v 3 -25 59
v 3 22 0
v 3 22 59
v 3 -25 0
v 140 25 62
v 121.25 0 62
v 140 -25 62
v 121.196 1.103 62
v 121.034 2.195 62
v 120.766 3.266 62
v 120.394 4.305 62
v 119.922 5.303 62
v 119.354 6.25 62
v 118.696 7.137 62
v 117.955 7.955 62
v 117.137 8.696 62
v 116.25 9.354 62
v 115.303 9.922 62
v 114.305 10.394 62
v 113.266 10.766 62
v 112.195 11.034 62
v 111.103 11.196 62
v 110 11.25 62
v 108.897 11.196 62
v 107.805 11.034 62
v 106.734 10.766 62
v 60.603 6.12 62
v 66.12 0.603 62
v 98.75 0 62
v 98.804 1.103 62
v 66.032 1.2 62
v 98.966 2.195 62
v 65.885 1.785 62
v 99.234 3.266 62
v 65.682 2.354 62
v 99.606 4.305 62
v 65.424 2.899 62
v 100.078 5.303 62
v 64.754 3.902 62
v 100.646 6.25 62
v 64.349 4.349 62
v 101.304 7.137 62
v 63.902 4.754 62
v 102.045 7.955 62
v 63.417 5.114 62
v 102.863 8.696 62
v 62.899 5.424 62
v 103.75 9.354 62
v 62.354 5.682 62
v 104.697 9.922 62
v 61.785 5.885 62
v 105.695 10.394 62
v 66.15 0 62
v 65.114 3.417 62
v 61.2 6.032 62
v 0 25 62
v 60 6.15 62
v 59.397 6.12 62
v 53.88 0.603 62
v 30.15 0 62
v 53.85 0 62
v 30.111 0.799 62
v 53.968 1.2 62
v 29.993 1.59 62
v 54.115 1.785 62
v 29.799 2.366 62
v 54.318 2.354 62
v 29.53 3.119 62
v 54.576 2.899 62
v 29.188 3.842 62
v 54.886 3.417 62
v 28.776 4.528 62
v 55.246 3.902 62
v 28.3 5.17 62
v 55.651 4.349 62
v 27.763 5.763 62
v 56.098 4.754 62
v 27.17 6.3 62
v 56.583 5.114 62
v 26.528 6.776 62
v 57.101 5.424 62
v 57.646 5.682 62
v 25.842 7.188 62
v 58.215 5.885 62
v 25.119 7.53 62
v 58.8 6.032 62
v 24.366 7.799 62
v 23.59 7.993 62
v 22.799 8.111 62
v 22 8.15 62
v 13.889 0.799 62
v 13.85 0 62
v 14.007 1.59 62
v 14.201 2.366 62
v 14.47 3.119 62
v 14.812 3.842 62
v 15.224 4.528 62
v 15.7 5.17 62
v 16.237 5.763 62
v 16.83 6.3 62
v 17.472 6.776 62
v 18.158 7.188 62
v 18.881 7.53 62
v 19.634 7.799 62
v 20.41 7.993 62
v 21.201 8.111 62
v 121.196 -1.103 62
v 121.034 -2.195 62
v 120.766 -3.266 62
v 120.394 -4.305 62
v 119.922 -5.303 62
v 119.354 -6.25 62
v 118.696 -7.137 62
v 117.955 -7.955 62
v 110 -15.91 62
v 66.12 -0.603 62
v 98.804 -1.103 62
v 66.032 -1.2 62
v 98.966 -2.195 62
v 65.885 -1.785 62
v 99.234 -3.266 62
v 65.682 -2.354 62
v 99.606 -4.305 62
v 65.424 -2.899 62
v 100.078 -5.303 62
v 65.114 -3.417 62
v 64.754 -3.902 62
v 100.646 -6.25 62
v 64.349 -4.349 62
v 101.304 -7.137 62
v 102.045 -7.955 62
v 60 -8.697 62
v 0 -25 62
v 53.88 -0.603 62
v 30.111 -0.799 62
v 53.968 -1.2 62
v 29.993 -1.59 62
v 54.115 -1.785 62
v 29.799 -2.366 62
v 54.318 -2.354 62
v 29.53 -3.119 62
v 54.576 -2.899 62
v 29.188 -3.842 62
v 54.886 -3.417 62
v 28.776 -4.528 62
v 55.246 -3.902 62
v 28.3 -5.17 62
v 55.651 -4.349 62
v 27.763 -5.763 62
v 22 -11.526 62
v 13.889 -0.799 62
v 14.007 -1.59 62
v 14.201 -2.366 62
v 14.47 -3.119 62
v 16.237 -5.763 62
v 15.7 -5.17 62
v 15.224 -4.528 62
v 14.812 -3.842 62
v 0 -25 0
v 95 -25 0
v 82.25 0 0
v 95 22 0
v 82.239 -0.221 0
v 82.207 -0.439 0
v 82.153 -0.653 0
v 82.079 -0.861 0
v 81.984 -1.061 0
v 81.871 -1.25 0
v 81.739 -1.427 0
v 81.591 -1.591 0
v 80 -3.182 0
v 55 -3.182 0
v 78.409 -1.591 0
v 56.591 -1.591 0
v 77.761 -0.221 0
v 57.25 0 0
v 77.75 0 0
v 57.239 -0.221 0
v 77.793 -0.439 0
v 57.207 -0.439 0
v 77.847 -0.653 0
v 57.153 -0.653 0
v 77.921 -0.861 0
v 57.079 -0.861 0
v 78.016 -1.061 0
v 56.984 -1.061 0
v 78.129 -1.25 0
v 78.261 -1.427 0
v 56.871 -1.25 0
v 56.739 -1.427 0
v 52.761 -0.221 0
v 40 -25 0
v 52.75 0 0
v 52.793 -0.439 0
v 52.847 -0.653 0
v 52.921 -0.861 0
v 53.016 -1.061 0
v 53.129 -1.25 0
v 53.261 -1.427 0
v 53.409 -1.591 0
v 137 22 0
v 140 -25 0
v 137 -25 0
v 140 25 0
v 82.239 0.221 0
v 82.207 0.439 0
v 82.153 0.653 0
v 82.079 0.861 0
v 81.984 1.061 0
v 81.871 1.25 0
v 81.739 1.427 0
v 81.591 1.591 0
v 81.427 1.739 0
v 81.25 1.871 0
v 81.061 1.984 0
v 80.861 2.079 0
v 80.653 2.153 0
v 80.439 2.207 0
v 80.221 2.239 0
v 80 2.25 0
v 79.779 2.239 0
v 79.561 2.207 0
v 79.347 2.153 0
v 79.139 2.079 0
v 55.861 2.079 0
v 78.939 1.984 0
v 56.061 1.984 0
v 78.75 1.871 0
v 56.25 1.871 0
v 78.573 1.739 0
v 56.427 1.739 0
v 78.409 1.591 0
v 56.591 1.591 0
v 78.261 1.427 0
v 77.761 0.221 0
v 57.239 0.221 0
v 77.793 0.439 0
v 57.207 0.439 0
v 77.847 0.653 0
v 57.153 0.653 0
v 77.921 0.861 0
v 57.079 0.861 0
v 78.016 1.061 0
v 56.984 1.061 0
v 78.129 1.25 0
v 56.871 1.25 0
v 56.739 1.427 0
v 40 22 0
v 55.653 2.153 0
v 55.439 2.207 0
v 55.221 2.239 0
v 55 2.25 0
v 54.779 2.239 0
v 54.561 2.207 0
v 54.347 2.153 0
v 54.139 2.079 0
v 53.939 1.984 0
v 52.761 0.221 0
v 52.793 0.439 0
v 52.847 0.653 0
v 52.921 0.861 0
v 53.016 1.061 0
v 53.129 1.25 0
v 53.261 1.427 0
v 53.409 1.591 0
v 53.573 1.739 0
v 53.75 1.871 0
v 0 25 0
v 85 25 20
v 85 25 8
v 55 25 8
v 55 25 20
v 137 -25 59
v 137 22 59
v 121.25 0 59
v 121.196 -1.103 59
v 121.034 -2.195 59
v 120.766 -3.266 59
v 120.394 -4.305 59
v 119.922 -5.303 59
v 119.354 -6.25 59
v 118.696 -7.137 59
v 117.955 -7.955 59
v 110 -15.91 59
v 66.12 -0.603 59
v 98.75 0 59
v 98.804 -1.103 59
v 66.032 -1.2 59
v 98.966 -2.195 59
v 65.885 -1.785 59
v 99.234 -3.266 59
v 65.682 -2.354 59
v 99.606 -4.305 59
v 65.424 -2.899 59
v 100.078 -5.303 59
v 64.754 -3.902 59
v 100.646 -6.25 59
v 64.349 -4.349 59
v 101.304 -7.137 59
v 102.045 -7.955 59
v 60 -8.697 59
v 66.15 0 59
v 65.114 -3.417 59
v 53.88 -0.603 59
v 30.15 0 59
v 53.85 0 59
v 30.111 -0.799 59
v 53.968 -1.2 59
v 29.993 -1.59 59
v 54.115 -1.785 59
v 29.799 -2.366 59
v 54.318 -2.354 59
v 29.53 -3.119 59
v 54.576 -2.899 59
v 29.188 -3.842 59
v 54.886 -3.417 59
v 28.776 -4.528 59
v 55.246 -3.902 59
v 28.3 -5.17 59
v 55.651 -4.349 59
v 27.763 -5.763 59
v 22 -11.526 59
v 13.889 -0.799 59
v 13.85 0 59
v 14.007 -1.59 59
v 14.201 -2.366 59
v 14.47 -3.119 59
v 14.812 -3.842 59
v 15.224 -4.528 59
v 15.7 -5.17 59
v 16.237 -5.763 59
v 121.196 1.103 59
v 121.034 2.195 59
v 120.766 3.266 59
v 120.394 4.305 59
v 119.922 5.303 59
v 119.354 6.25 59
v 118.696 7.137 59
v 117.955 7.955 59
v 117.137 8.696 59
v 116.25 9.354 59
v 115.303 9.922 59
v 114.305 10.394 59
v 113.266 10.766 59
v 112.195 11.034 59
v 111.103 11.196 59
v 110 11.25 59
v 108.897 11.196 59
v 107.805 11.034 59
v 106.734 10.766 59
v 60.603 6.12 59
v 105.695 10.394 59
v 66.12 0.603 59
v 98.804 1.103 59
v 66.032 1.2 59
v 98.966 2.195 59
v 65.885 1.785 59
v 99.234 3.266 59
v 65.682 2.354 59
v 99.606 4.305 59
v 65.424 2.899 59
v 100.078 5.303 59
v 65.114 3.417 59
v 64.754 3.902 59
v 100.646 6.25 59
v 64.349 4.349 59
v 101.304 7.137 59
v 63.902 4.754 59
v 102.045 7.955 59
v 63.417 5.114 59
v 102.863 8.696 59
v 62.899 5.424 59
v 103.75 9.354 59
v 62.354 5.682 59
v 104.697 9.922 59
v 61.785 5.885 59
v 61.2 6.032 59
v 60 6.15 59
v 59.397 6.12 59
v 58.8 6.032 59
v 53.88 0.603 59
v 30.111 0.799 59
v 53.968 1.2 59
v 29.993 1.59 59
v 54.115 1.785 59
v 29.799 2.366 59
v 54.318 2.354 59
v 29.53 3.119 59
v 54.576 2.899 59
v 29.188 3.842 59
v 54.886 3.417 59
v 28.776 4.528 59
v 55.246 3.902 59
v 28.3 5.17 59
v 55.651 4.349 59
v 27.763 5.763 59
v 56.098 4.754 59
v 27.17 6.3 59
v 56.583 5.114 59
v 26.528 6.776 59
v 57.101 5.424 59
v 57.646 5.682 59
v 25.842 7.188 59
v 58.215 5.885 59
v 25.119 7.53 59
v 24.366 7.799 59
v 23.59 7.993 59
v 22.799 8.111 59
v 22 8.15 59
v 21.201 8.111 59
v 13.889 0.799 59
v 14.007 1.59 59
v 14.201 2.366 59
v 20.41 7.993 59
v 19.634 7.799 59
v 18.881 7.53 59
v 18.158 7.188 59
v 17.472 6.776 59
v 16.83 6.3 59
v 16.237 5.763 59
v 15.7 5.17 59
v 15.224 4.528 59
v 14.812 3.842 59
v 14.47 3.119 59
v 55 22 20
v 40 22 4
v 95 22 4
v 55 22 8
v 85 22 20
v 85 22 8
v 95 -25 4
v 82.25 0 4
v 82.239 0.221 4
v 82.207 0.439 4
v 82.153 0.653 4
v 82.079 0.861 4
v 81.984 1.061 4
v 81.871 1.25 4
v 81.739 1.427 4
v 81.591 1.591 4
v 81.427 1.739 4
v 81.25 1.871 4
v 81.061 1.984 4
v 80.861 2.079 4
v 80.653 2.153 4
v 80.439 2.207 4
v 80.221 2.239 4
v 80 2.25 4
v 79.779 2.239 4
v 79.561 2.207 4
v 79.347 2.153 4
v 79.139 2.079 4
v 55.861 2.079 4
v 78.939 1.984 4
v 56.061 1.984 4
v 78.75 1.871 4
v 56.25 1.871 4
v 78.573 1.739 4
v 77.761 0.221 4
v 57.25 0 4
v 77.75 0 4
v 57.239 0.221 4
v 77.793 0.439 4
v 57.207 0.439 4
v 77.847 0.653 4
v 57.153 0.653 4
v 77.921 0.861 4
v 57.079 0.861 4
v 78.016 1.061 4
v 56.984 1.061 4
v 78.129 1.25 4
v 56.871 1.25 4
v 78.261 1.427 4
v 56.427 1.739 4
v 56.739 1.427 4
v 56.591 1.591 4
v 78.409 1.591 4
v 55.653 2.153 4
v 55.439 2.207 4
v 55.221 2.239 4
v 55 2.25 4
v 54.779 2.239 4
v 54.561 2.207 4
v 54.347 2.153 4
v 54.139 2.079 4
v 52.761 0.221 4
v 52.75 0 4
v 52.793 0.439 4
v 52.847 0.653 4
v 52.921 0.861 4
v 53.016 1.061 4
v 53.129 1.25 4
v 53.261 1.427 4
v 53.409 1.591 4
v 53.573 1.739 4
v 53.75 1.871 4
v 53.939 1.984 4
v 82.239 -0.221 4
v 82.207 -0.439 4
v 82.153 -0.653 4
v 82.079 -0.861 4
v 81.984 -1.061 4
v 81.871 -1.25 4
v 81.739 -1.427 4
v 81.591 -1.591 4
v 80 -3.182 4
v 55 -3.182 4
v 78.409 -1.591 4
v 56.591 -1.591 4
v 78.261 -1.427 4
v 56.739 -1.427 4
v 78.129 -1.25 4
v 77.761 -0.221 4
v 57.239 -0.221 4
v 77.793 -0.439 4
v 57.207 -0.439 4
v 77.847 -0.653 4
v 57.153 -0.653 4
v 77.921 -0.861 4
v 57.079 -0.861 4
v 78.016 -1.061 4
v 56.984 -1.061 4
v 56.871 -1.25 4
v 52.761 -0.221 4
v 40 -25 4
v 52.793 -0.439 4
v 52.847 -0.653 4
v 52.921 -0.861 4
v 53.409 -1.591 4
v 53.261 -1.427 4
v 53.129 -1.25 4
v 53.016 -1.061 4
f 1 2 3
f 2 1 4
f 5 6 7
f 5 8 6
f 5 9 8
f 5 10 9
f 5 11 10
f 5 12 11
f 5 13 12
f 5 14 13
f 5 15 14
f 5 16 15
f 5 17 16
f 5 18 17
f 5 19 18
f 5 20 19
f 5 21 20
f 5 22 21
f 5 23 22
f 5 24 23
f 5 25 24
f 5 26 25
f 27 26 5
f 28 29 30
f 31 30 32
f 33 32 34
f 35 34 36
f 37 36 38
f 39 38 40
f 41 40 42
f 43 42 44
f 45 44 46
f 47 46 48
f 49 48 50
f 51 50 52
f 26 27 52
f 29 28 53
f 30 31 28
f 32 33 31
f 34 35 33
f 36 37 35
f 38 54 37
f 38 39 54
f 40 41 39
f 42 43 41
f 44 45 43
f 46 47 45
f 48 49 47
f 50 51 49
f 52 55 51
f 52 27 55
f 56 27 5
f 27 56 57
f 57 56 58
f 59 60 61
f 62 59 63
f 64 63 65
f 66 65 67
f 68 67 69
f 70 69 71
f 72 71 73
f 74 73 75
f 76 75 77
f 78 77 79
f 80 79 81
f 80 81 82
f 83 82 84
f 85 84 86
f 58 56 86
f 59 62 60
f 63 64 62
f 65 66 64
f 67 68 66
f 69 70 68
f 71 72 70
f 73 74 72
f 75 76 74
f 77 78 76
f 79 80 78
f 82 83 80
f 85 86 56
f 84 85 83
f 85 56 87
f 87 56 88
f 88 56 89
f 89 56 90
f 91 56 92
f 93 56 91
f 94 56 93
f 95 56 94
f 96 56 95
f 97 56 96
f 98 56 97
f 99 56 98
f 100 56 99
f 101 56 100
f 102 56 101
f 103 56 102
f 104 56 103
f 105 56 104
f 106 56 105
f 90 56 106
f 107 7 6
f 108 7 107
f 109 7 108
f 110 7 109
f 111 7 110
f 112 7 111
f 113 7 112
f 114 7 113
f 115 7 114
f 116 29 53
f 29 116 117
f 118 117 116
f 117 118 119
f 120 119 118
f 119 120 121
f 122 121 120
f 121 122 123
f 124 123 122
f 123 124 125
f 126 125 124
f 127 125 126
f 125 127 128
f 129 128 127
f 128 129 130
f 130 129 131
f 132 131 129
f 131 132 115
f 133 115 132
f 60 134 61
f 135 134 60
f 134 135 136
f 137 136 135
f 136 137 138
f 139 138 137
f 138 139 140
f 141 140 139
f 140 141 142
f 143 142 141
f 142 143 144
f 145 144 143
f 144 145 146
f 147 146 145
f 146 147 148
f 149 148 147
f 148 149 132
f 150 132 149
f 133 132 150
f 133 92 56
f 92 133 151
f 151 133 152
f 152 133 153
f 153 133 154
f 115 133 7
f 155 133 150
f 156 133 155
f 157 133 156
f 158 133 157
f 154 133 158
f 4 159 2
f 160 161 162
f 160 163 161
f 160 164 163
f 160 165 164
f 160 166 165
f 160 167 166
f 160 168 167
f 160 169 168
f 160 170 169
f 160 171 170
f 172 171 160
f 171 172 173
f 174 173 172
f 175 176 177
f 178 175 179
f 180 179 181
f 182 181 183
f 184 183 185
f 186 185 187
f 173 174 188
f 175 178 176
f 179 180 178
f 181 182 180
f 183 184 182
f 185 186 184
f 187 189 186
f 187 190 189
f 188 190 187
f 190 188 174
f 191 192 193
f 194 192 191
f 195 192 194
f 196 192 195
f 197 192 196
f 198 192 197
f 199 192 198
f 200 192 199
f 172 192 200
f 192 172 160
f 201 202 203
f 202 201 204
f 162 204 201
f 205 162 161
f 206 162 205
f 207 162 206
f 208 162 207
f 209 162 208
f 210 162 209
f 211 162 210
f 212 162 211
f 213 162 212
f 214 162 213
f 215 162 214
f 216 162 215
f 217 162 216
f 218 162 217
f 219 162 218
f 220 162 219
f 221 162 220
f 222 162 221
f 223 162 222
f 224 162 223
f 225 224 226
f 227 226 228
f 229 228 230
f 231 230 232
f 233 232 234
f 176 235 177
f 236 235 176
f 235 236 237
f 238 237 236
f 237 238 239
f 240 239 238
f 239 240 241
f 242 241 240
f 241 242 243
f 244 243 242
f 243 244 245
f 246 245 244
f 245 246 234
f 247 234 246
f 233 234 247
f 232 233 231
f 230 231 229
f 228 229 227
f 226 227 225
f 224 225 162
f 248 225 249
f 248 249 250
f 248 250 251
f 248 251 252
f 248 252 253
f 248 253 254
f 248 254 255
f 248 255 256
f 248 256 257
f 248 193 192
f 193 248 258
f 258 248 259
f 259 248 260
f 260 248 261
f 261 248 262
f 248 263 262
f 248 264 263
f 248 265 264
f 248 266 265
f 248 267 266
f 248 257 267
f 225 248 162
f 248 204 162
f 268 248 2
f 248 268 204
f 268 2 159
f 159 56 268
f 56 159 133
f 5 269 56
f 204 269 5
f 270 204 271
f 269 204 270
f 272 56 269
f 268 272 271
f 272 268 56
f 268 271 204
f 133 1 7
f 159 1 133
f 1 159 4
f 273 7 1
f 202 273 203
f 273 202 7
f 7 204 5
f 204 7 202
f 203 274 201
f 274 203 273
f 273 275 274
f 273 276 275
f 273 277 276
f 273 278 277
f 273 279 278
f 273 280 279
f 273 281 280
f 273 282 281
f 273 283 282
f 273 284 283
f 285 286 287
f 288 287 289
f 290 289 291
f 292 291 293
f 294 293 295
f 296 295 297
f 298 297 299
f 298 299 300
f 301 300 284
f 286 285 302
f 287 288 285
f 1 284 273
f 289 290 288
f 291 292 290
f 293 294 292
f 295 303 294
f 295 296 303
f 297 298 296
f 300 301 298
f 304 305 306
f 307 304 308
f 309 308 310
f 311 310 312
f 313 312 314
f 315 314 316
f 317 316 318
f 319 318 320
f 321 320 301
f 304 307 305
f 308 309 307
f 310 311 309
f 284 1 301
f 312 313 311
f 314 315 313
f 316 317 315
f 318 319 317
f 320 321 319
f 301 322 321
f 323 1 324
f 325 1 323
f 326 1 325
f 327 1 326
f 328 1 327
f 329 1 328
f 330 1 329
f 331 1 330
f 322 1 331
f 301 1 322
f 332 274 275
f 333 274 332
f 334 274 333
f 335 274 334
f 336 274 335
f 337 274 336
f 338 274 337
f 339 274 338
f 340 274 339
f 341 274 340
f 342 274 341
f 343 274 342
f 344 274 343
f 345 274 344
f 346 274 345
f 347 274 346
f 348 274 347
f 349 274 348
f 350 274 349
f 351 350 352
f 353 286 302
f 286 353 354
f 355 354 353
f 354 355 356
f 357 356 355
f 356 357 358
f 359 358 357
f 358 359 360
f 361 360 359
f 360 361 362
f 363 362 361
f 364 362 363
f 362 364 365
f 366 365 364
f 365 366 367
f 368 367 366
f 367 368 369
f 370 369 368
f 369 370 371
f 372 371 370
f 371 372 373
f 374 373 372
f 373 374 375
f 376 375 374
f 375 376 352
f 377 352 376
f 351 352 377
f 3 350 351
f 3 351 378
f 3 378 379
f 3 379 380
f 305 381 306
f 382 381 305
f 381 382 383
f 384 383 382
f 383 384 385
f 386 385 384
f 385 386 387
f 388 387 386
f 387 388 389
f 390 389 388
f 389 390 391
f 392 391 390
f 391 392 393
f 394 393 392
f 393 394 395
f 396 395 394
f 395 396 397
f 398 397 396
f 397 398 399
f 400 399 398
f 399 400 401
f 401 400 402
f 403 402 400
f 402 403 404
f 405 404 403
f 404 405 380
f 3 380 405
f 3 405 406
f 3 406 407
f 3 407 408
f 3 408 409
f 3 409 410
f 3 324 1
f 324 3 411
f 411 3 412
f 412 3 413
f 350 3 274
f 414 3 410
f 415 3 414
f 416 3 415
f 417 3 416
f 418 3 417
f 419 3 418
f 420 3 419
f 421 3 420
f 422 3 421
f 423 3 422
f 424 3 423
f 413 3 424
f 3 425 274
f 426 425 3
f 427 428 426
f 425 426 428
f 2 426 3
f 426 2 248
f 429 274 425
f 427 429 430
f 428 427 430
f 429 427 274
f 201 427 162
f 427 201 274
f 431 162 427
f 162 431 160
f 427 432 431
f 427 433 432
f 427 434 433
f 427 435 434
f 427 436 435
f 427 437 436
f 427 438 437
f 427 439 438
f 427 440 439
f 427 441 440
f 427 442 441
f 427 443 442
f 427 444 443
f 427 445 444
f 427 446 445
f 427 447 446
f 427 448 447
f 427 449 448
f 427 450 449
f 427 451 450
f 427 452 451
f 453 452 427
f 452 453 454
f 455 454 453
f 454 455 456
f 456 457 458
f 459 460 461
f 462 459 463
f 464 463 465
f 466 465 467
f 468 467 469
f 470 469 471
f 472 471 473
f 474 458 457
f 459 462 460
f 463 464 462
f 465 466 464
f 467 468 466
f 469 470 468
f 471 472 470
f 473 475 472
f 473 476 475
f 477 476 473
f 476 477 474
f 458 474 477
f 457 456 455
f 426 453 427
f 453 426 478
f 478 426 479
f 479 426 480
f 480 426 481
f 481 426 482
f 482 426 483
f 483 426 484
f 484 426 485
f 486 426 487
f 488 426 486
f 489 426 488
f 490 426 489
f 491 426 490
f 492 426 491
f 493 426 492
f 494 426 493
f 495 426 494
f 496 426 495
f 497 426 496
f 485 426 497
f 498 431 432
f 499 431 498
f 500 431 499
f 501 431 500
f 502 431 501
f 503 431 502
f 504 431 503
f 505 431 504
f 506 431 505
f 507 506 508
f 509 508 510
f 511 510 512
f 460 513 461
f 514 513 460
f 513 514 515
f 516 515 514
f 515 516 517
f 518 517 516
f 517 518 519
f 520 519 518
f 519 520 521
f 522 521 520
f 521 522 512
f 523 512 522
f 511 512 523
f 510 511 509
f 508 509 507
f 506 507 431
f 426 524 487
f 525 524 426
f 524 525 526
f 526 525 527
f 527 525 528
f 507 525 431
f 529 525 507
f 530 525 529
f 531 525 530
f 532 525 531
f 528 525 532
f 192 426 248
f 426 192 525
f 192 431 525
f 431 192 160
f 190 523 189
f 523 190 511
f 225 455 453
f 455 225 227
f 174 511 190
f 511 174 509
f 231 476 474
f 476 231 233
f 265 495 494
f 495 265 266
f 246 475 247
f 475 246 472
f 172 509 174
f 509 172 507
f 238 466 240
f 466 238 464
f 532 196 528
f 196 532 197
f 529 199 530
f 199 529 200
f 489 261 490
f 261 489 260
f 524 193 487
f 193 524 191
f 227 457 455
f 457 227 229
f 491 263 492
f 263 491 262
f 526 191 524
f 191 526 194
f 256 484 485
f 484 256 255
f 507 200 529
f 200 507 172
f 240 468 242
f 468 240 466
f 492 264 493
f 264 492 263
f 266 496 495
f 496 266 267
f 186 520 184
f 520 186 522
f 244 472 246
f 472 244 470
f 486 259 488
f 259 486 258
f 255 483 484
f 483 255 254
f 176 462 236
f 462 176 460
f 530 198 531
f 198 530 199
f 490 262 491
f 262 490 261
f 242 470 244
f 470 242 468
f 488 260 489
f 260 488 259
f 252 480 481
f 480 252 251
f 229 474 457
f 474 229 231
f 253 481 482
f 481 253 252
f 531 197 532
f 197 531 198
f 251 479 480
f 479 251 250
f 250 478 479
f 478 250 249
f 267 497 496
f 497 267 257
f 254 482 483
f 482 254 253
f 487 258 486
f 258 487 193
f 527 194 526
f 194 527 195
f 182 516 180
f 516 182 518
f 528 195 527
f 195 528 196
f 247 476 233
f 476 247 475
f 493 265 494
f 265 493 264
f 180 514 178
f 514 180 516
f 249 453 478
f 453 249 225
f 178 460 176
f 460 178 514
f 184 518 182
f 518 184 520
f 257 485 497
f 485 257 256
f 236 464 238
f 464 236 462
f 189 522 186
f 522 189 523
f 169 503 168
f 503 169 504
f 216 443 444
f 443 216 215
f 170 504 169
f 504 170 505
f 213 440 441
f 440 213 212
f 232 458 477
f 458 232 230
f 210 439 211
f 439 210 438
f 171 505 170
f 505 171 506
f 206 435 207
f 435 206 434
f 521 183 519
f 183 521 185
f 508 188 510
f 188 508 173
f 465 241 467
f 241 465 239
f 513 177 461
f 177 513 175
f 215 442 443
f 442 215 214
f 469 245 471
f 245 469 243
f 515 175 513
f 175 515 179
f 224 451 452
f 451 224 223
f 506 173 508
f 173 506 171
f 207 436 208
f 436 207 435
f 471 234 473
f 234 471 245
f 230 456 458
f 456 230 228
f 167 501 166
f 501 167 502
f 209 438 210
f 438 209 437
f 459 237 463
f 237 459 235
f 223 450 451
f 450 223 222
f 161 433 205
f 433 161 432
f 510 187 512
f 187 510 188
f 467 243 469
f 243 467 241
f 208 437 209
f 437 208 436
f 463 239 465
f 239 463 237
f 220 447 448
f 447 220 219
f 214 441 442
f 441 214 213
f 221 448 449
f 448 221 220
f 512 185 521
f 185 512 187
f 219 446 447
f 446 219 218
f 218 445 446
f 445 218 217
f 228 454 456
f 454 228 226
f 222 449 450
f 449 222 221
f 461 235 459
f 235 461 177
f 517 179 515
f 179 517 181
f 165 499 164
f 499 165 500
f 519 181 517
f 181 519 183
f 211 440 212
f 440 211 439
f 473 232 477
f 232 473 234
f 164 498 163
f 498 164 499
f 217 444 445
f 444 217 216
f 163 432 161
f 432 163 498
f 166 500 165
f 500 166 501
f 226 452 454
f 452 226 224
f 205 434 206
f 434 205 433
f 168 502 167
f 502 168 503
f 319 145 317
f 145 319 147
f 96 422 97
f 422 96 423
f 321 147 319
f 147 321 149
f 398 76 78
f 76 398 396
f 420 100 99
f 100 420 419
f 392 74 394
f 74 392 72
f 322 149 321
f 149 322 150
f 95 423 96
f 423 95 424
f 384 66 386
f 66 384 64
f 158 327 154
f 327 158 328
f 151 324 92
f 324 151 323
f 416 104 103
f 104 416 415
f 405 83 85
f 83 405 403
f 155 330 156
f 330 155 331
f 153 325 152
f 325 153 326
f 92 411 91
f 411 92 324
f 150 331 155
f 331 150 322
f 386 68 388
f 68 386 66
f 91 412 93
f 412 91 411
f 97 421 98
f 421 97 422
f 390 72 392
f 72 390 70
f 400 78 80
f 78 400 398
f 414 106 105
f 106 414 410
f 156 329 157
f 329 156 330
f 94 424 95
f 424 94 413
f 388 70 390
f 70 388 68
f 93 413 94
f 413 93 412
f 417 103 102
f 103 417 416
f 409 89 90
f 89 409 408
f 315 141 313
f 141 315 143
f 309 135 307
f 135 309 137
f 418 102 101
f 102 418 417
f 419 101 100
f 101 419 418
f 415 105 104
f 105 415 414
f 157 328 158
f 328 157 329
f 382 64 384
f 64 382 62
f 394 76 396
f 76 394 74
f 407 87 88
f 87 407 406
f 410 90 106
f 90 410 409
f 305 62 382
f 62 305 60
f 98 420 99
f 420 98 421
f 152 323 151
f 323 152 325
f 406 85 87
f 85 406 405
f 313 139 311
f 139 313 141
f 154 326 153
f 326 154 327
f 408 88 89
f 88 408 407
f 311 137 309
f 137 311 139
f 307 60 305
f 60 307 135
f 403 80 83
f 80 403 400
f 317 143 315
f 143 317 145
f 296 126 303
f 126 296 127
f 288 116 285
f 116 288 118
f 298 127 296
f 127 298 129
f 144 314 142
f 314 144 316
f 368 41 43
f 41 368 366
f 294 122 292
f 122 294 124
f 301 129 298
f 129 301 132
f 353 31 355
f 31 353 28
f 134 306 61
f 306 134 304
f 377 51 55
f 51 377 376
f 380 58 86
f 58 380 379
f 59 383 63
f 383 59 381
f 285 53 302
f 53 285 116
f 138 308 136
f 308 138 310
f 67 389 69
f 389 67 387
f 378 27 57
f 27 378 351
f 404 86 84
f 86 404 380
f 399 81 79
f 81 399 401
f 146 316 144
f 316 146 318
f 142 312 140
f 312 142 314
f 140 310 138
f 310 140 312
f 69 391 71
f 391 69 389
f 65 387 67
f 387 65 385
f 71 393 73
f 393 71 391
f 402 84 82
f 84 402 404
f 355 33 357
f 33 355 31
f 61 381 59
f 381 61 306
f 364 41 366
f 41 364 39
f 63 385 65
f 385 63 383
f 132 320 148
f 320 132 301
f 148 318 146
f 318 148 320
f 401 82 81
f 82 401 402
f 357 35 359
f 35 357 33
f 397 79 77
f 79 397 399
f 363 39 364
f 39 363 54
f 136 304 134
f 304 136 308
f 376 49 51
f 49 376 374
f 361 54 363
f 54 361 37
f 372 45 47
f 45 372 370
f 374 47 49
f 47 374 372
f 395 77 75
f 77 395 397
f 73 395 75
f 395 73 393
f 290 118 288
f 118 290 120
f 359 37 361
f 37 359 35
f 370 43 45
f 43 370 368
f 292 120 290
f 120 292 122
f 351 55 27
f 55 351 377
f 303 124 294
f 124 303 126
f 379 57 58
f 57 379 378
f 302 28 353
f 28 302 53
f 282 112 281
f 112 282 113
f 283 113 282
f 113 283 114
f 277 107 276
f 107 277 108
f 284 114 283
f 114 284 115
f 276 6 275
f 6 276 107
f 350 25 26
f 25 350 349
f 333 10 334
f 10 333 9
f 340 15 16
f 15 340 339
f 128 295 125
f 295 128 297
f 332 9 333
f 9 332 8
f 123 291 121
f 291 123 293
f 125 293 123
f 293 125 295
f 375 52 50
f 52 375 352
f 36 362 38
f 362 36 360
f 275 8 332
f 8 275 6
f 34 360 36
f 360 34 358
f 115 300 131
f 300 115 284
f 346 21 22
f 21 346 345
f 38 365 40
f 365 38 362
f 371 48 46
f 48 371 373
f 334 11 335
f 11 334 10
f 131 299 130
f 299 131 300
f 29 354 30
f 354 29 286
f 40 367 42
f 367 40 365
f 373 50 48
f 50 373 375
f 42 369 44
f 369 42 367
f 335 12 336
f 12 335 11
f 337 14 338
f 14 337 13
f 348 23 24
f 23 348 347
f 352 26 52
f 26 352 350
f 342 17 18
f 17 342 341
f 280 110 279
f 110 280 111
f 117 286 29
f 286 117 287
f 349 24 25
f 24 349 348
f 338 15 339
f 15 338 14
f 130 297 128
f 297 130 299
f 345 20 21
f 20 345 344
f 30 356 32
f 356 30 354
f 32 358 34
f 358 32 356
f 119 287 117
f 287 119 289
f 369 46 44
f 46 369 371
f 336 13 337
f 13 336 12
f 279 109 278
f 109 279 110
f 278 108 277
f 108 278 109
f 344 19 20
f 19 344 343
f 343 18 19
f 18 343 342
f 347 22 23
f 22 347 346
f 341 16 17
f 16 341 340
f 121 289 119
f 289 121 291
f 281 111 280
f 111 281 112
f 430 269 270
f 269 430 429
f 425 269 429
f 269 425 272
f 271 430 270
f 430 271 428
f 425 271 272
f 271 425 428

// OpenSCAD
// Temporary control console for the physical drive test (v3 chassis).
// Holds the 22 mm E-stop (NC -> D33), the covered toggle switch and the
// START/ARM push button (D32). Bolts to the top M4 grid of
// rail_extension_left at global X100/X125 (25 mm pitch, rail centreline).
// Not the final location: the body-panel concept puts these in a rear console.
//
// Local frame: X along the rail (global X = x + 45), Y across the rail
// (+Y outboard), Z up from the rail top. Units mm.
//
// Print: lying on the outer wall (part="print"), inner side up. All walls are
// then vertical, the holes are horizontal teardrops and nothing needs support.
// Bolting: M4x40 up from under the rail, washer + nut on the foot inside the
// console (reach through the open inner side).

part = "assembly"; // [assembly, print, fit_coupon]
$fn = 64;

// Measured by the user 2026-10-16 (body below the panel):
estop_body   = [35, 30];   // contact-block footprint
toggle_body  = [27, 15];
button_body_d = 15;

// Panel holes. Defaults are the usual sizes for these parts; print
// part="fit_coupon" first and adjust here if a part is loose or tight.
estop_hole  = 22.5;
toggle_hole = 12.3;
button_hole = 16.3; // R16-504BD, ordered-parts G7

L = 140; W = 50; H = 62;        // console envelope, H = rail top to panel top
wall = 3; panel_t = 3; foot_t = 4;
foot_x0 = 40; foot_x1 = 95;
grid_x = [55, 80];              // global X100 / X125
m4_clear = 4.5;

// Component centres along X on the panel.
button_x = 22; toggle_x = 60; estop_x = 110;

// Teardrop hole along Z whose point faces -Y (print "up" in part="print").
module teardrop_z(d, h) {
    linear_extrude(height = h, center = true)
        union() {
            circle(d = d);
            rotate(45 + 180) square(d / 2);   // 45 deg roof toward -Y
        }
}

module console() {
    difference() {
        union() {
            translate([0, -W/2, H - panel_t]) cube([L, W, panel_t]);        // panel
            translate([0, W/2 - wall, 0]) cube([L, wall, H]);              // outer wall
            for (x = [0, L - wall]) translate([x, -W/2, 0]) cube([wall, W, H]); // end walls
            translate([foot_x0, -W/2, 0]) cube([foot_x1 - foot_x0, W, foot_t]); // bolt foot
        }
        // Panel holes.
        translate([button_x, 0, H - panel_t/2]) teardrop_z(button_hole, panel_t + 2);
        translate([toggle_x, 0, H - panel_t/2]) teardrop_z(toggle_hole, panel_t + 2);
        translate([estop_x,  0, H - panel_t/2]) teardrop_z(estop_hole,  panel_t + 2);
        // M4 grid bolts.
        for (x = grid_x) translate([x, 0, foot_t/2]) teardrop_z(m4_clear, foot_t + 2);
        // Cable exit through the outer wall near the rail top.
        translate([L/2, W/2 - wall/2, 14]) cube([30, wall + 2, 12], center = true);
    }
}

// Ghost bodies under the panel, to check that nothing collides.
module bodies() {
    %translate([estop_x, 0, H - panel_t - 50/2]) cube([estop_body[0], estop_body[1], 50], center = true);
    %translate([toggle_x, 0, H - panel_t - 30/2]) cube([toggle_body[0], toggle_body[1], 30], center = true);
    %translate([button_x, 0, H - panel_t - 25/2]) cylinder(d = button_body_d, h = 25, center = true);
}

// Small plate with the three panel holes, to check fit before the console.
module fit_coupon() {
    difference() {
        translate([0, -15, 0]) cube([130, 30, panel_t]);
        translate([15, 0, panel_t/2])  teardrop_z(button_hole, panel_t + 2);
        translate([45, 0, panel_t/2])  teardrop_z(toggle_hole, panel_t + 2);
        translate([95, 0, panel_t/2])  teardrop_z(estop_hole,  panel_t + 2);
    }
}

if (part == "print") rotate([-90, 0, 0]) translate([0, -W/2, 0]) console();
else if (part == "fit_coupon") fit_coupon();
else { console(); bodies(); }

// Checks: E-stop body (assumed 50 mm deep) must clear the bolt foot.
assert(H - panel_t - 50 >= foot_t || estop_x - estop_body[0]/2 >= foot_x1,
       "E-stop body hits the bolt foot");
assert(estop_x + 40/2 <= L, "E-stop mushroom overhangs the console end");
